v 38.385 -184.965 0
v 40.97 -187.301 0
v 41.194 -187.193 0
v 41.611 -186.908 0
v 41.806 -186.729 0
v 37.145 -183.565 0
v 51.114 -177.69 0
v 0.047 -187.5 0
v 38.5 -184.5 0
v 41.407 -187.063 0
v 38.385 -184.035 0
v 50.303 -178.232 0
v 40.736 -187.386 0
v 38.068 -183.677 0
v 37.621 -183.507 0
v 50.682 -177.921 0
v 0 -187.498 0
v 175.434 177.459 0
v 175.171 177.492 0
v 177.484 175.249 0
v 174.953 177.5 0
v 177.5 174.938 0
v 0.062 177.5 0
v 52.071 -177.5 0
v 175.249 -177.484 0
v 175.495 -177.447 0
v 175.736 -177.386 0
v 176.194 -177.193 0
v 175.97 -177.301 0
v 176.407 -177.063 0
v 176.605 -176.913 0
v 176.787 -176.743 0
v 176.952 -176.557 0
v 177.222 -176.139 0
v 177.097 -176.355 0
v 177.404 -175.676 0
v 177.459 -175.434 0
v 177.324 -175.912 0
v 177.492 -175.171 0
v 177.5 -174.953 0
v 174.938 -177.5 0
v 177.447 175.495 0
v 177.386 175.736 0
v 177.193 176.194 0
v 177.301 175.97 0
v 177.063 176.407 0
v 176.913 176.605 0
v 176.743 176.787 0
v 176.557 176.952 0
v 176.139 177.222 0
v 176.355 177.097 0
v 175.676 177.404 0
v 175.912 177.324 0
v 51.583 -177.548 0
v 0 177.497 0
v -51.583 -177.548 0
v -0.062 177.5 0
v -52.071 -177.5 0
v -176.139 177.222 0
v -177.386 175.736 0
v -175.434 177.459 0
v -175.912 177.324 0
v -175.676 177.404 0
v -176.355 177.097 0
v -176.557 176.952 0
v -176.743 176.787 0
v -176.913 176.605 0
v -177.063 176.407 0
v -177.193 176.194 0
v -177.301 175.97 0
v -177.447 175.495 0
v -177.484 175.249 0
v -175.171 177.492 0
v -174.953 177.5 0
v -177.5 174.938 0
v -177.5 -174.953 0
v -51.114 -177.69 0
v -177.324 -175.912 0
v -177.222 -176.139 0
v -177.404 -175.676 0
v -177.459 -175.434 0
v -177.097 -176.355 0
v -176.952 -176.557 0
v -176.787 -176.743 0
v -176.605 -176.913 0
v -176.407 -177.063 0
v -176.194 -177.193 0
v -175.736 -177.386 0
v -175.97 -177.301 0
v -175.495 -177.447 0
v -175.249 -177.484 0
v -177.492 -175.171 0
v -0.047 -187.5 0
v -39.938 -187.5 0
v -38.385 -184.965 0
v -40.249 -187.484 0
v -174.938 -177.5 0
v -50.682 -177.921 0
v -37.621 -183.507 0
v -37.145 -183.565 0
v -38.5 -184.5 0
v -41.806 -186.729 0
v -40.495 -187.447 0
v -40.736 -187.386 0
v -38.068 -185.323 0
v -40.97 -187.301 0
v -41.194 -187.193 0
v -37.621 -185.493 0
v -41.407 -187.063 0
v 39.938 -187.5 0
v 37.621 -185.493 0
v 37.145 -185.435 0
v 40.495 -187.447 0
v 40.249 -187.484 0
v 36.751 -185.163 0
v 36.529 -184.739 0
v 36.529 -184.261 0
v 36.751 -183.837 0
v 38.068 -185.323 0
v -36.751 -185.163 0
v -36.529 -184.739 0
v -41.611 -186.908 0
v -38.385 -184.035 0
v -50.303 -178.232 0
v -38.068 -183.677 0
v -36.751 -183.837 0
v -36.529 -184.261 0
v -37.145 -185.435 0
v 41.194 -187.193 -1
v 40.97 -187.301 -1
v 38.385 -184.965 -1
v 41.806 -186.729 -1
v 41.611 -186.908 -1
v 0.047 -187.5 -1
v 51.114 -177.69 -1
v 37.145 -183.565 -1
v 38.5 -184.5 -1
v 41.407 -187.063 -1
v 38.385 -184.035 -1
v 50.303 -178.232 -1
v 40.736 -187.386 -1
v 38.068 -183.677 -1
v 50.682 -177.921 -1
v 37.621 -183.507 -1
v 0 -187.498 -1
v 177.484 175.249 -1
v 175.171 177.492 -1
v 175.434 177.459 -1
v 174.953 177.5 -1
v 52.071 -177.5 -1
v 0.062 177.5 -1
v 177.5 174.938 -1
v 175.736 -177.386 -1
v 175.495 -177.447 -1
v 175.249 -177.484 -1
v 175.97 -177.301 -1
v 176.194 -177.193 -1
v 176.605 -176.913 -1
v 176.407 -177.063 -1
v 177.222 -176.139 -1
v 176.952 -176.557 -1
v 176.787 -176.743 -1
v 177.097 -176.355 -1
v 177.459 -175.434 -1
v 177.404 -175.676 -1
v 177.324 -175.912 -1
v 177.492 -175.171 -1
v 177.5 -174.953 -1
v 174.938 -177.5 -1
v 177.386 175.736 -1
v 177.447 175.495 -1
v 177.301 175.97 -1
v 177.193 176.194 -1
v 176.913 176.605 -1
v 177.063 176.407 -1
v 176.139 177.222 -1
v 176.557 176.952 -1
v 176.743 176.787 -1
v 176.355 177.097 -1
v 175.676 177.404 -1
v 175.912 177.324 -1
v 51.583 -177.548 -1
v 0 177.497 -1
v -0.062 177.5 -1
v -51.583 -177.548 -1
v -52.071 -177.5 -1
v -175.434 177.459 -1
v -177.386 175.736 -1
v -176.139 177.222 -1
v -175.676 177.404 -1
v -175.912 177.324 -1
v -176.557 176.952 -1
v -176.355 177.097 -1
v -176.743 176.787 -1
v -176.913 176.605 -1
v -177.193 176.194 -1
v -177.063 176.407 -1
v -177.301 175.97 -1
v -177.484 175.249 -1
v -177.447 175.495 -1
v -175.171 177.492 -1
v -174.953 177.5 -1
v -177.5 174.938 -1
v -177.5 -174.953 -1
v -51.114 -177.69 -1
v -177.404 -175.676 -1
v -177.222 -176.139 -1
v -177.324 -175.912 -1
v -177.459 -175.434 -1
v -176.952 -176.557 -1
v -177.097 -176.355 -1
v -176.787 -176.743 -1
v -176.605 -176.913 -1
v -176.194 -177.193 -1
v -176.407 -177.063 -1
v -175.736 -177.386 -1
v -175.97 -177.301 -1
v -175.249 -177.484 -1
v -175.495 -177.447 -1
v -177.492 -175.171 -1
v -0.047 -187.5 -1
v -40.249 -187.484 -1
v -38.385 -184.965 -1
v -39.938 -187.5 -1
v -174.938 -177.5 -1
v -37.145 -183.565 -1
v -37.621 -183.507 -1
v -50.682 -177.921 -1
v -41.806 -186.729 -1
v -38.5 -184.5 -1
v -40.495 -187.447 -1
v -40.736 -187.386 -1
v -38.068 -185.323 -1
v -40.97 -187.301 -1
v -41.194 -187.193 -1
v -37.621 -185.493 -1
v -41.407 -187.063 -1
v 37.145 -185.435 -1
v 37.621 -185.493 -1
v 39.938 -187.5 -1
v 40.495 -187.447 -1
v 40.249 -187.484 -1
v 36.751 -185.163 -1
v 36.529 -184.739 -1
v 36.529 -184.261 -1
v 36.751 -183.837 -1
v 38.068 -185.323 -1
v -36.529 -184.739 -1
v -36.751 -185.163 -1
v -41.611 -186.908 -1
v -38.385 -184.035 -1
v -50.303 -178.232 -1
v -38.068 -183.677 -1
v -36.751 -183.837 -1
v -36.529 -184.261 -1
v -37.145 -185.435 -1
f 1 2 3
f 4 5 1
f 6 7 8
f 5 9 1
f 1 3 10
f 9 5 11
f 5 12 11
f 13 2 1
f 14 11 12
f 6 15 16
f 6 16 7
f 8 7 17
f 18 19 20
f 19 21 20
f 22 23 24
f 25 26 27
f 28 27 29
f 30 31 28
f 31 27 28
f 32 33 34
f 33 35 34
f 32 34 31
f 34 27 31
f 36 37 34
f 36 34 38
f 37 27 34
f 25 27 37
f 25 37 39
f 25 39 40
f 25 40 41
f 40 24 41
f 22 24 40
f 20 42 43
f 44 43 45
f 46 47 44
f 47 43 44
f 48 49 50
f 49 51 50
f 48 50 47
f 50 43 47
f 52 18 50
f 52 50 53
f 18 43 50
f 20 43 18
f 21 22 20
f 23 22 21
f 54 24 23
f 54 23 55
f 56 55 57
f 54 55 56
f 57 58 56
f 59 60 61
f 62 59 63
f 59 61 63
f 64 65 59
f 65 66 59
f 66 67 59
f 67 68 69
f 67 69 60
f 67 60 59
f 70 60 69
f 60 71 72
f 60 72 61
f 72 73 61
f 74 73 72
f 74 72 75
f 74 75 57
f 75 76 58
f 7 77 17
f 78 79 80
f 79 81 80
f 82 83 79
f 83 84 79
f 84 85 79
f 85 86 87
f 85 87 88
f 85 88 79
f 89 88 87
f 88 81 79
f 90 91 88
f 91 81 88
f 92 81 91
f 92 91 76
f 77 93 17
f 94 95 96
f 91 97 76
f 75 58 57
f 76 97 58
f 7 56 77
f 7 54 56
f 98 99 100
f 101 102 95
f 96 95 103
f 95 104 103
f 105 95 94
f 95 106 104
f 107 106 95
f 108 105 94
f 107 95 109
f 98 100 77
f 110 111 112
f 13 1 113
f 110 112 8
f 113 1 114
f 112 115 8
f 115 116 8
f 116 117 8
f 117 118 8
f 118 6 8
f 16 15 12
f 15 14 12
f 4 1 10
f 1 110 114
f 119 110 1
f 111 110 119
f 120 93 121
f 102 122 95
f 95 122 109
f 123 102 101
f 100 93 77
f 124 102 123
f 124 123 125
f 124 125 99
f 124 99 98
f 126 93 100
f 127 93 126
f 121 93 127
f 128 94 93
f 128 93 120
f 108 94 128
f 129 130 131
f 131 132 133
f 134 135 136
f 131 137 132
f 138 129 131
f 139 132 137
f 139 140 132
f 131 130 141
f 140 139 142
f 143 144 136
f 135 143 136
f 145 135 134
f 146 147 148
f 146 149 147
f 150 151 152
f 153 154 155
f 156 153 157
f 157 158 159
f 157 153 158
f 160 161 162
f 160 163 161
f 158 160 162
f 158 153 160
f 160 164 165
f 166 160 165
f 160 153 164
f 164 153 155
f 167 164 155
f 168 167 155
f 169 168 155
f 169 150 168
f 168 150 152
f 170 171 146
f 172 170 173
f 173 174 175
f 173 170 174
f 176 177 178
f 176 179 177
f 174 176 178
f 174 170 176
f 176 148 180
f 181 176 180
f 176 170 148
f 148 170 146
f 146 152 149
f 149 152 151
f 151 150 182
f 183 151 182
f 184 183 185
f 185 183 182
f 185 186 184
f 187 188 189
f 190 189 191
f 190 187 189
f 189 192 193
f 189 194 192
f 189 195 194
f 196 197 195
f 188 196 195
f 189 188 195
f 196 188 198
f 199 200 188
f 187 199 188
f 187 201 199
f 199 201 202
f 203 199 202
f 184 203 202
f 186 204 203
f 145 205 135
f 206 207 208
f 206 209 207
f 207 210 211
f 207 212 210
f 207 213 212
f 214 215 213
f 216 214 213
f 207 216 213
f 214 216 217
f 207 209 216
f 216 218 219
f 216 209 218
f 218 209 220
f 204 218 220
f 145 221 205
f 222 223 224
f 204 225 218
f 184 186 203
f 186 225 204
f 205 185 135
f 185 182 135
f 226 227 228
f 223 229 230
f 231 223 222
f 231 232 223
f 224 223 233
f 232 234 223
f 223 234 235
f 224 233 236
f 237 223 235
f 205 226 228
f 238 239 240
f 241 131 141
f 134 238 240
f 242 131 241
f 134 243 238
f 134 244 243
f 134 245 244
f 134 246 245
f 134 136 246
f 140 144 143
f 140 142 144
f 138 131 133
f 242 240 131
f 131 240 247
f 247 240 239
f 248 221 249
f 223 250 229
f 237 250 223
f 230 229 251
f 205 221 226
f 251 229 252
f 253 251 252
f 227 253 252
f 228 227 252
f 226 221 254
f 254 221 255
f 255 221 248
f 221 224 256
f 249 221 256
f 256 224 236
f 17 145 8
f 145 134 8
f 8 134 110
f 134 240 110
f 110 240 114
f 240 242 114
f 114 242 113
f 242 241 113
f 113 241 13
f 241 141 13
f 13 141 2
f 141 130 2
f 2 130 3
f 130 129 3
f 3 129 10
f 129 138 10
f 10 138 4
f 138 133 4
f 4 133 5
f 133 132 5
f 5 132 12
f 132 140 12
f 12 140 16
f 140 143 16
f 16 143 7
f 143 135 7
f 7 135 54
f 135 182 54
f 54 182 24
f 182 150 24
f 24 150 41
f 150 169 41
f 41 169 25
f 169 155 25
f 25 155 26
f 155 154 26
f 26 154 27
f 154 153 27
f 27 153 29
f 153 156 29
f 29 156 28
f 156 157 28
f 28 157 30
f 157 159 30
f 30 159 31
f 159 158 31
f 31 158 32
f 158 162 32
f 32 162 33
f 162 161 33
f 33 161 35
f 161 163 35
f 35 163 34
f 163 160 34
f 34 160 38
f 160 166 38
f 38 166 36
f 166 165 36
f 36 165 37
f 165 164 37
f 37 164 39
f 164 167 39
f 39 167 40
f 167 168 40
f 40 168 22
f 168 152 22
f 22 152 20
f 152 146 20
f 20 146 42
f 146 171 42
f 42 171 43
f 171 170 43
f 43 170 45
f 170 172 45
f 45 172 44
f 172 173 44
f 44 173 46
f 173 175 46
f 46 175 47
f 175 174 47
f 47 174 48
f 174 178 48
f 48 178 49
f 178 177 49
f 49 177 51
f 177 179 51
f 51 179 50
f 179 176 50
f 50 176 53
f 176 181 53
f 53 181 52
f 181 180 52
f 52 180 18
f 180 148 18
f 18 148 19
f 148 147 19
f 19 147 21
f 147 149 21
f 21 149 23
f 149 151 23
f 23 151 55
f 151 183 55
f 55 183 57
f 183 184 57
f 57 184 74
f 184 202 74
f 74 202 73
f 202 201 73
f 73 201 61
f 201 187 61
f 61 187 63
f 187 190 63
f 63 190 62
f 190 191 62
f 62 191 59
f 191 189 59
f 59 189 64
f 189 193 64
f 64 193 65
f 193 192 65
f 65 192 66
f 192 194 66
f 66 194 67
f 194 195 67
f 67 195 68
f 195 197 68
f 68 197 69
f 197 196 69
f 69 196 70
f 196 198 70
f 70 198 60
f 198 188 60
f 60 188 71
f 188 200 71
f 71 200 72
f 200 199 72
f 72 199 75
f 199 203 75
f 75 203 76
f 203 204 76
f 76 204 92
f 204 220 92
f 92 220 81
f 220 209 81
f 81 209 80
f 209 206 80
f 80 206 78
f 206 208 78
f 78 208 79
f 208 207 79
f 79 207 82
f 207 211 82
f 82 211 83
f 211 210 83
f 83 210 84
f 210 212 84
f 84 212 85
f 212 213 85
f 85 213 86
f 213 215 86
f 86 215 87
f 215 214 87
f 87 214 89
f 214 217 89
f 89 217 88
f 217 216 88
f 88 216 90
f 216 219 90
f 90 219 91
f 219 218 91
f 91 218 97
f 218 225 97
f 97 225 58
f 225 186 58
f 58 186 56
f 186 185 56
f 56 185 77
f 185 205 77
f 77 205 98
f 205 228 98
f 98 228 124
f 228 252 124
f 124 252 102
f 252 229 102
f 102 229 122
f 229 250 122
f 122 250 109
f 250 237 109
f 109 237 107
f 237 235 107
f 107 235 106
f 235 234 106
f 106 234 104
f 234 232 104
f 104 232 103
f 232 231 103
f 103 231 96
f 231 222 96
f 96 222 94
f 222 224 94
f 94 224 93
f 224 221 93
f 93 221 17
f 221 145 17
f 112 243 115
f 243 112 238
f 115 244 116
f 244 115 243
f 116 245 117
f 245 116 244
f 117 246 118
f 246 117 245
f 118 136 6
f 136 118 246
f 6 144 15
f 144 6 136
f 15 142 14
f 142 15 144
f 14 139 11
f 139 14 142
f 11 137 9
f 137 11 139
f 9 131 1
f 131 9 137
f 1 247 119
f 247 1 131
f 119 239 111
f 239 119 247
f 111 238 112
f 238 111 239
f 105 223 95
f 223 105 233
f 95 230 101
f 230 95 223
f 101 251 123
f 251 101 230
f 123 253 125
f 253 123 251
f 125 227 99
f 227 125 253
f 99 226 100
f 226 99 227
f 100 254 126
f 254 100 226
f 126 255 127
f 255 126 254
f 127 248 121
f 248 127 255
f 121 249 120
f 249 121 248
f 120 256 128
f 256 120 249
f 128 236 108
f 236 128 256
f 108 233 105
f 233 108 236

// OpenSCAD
$fa=1;
$fs=0.5;
type=350; // [120, "mk52", 250, 300, 350]
size=(type=="mk52")?[250, 210]:[type, type];
eps=1/128;

function logodata(a=1) = [for(p=[for(i=[0:2], j=[-1, 1]) [i-1, (i%2+1)*j],
            for(i=[-2.5:2.5], j=[i>1?0:1, i<-1?0:-1])
                [i/2/sqrt(3), 0]+j*(1/3+sqrt(3)/50)*[1, 3]])
        a/2*[p.x, p.y/sqrt(3)]];
        
module solid(s) mirror([0, 0, 1]) linear_extrude(1)
    for(i=[0, 1]) mirror([i, 0]) difference() {
        offset(r=-2.5) offset(r=5) polygon([
            [s.x/2, -s.y/2],
            [s.x/2, s.y/2],
            [ 0,  s.y/2],
            [ 0, -s.y/2-10],
            [size.x>150?40:20, -s.y/2-10],
            [size.x>150?50:30, -s.y/2]]);
        translate([37.5/(size.x>150?1:2), -s.y/2-9.5]) circle(1);
    };

module mk52() mirror([0, 0, 1]) linear_extrude(1)
    offset(r=1) offset(r=-2) offset(r=1) difference() {
        translate([0, -1.5]) offset(r=5) square([244, 231], center=true);
        for(i=[-1, 1]) translate([145.5/2*i, -234/2]) circle(d=3.5);
        hull() for(i=[-1, 1]) translate([71*i, 238/2])
            rotate(30) circle(r=4, $fn=3);
    }

function join(s, sep = "") = 
    len(s) == 0 ? "" : 
    len(s) == 1 ? str(s[0]) : 
    str(s[0], sep, join([for (i = [1 : len(s)-1]) s[i]], sep));
    
module clippv(c, s) if($preview) color(c)
    linear_extrude(eps, center=true) intersection() {
        square(s, center=true);
        translate(-s/2) children();
    }
    
module line(p1, p2, w, s) {
    echo(str("  <line x1='", p1.x, "' x2='", p2.x,
                   "' y1='", s.y-p1.y, "' y2='", s.y-p2.y,
                   "' style='fill: none; stroke: white; ",
                     "stroke-miterlimit: 10; stroke-width: ", w, ";'/>"));
    clippv("white", s) translate(p1) rotate(atan2(p2.y-p1.y, p2.x-p1.x))
        translate([0, -w/2]) square([norm(p2-p1), w]);
}

module poly(p, s) {
    echo(str("  <polygon points='", join([for(i=p) str(i.x, ",", s.y-i.y)], " "),
             "' fill='red' stroke='none' />"));
    clippv("red", s) polygon(p);
}

module svg(s) let(ld=logodata(35)) {
    echo("<?xml version='1.0' encoding='UTF-8'?>");
    echo(str("<svg id='l1' xmlns='http://www.w3.org/2000/svg' width='", s.x,
        "mm' height='", s.y, "mm' viewBox='0 0 ", s.x, " ", s.y, "'>"));
    for(i=[0, s.x]) line([i, 0], [i, s.y], 2, s);
    for(i=[10:10:s.x-eps]) {
        line([i, 0], [i, ((i>s.x-25+ld[0].x && i<s.x-25+ld[5].x)?
            (25+ld[2].y+(i-s.x+25)/sqrt(3)*sign(i-s.x+25)):s.y)],
            (i%50)?0.25:0.5, s);
        if(i>s.x-25+ld[0].x && i<s.x-25+ld[5].x)
            line([i, 25+ld[3].y-(i-s.x+25)/sqrt(3)*sign(i-s.x+25)], [i, s.y],
                (i%50)?0.25:0.5, s);
    }
    for(i=[0, s.y]) line([0, i], [s.x, i], 2, s);
    for(i=[10:10:s.y-eps]) {
        line([0, i], [s.x-((i>25+ld[2].y && i<25+ld[3].y)?
            (25+((i>25+ld[0].y && i<25+ld[5].y)?
            ld[5].x:2*ld[5].x-(i-25)*sqrt(3)*sign(i-25))):0), i],
            (i%50)?0.25:0.5, s);
        if(i>25+ld[2].y && i<25+ld[3].y)
            line([s.x-(25+((i>25+ld[0].y && i<25+ld[5].y)?
                ld[0].x:2*ld[0].x+(i-25)*sqrt(3)*sign(i-25))), i], [s.x, i],
                (i%50)?0.25:0.5, s);
        }
    for(i=[6:4:14]) poly([for(p=[for(j=[0, 1, 3, 2]) ld[i+j]]) [s.x-25, 25]+p], s);
    echo("</svg>");
}

color("#3f3f3f") if(type=="mk52") mk52(); else solid(size);
svg(size);
